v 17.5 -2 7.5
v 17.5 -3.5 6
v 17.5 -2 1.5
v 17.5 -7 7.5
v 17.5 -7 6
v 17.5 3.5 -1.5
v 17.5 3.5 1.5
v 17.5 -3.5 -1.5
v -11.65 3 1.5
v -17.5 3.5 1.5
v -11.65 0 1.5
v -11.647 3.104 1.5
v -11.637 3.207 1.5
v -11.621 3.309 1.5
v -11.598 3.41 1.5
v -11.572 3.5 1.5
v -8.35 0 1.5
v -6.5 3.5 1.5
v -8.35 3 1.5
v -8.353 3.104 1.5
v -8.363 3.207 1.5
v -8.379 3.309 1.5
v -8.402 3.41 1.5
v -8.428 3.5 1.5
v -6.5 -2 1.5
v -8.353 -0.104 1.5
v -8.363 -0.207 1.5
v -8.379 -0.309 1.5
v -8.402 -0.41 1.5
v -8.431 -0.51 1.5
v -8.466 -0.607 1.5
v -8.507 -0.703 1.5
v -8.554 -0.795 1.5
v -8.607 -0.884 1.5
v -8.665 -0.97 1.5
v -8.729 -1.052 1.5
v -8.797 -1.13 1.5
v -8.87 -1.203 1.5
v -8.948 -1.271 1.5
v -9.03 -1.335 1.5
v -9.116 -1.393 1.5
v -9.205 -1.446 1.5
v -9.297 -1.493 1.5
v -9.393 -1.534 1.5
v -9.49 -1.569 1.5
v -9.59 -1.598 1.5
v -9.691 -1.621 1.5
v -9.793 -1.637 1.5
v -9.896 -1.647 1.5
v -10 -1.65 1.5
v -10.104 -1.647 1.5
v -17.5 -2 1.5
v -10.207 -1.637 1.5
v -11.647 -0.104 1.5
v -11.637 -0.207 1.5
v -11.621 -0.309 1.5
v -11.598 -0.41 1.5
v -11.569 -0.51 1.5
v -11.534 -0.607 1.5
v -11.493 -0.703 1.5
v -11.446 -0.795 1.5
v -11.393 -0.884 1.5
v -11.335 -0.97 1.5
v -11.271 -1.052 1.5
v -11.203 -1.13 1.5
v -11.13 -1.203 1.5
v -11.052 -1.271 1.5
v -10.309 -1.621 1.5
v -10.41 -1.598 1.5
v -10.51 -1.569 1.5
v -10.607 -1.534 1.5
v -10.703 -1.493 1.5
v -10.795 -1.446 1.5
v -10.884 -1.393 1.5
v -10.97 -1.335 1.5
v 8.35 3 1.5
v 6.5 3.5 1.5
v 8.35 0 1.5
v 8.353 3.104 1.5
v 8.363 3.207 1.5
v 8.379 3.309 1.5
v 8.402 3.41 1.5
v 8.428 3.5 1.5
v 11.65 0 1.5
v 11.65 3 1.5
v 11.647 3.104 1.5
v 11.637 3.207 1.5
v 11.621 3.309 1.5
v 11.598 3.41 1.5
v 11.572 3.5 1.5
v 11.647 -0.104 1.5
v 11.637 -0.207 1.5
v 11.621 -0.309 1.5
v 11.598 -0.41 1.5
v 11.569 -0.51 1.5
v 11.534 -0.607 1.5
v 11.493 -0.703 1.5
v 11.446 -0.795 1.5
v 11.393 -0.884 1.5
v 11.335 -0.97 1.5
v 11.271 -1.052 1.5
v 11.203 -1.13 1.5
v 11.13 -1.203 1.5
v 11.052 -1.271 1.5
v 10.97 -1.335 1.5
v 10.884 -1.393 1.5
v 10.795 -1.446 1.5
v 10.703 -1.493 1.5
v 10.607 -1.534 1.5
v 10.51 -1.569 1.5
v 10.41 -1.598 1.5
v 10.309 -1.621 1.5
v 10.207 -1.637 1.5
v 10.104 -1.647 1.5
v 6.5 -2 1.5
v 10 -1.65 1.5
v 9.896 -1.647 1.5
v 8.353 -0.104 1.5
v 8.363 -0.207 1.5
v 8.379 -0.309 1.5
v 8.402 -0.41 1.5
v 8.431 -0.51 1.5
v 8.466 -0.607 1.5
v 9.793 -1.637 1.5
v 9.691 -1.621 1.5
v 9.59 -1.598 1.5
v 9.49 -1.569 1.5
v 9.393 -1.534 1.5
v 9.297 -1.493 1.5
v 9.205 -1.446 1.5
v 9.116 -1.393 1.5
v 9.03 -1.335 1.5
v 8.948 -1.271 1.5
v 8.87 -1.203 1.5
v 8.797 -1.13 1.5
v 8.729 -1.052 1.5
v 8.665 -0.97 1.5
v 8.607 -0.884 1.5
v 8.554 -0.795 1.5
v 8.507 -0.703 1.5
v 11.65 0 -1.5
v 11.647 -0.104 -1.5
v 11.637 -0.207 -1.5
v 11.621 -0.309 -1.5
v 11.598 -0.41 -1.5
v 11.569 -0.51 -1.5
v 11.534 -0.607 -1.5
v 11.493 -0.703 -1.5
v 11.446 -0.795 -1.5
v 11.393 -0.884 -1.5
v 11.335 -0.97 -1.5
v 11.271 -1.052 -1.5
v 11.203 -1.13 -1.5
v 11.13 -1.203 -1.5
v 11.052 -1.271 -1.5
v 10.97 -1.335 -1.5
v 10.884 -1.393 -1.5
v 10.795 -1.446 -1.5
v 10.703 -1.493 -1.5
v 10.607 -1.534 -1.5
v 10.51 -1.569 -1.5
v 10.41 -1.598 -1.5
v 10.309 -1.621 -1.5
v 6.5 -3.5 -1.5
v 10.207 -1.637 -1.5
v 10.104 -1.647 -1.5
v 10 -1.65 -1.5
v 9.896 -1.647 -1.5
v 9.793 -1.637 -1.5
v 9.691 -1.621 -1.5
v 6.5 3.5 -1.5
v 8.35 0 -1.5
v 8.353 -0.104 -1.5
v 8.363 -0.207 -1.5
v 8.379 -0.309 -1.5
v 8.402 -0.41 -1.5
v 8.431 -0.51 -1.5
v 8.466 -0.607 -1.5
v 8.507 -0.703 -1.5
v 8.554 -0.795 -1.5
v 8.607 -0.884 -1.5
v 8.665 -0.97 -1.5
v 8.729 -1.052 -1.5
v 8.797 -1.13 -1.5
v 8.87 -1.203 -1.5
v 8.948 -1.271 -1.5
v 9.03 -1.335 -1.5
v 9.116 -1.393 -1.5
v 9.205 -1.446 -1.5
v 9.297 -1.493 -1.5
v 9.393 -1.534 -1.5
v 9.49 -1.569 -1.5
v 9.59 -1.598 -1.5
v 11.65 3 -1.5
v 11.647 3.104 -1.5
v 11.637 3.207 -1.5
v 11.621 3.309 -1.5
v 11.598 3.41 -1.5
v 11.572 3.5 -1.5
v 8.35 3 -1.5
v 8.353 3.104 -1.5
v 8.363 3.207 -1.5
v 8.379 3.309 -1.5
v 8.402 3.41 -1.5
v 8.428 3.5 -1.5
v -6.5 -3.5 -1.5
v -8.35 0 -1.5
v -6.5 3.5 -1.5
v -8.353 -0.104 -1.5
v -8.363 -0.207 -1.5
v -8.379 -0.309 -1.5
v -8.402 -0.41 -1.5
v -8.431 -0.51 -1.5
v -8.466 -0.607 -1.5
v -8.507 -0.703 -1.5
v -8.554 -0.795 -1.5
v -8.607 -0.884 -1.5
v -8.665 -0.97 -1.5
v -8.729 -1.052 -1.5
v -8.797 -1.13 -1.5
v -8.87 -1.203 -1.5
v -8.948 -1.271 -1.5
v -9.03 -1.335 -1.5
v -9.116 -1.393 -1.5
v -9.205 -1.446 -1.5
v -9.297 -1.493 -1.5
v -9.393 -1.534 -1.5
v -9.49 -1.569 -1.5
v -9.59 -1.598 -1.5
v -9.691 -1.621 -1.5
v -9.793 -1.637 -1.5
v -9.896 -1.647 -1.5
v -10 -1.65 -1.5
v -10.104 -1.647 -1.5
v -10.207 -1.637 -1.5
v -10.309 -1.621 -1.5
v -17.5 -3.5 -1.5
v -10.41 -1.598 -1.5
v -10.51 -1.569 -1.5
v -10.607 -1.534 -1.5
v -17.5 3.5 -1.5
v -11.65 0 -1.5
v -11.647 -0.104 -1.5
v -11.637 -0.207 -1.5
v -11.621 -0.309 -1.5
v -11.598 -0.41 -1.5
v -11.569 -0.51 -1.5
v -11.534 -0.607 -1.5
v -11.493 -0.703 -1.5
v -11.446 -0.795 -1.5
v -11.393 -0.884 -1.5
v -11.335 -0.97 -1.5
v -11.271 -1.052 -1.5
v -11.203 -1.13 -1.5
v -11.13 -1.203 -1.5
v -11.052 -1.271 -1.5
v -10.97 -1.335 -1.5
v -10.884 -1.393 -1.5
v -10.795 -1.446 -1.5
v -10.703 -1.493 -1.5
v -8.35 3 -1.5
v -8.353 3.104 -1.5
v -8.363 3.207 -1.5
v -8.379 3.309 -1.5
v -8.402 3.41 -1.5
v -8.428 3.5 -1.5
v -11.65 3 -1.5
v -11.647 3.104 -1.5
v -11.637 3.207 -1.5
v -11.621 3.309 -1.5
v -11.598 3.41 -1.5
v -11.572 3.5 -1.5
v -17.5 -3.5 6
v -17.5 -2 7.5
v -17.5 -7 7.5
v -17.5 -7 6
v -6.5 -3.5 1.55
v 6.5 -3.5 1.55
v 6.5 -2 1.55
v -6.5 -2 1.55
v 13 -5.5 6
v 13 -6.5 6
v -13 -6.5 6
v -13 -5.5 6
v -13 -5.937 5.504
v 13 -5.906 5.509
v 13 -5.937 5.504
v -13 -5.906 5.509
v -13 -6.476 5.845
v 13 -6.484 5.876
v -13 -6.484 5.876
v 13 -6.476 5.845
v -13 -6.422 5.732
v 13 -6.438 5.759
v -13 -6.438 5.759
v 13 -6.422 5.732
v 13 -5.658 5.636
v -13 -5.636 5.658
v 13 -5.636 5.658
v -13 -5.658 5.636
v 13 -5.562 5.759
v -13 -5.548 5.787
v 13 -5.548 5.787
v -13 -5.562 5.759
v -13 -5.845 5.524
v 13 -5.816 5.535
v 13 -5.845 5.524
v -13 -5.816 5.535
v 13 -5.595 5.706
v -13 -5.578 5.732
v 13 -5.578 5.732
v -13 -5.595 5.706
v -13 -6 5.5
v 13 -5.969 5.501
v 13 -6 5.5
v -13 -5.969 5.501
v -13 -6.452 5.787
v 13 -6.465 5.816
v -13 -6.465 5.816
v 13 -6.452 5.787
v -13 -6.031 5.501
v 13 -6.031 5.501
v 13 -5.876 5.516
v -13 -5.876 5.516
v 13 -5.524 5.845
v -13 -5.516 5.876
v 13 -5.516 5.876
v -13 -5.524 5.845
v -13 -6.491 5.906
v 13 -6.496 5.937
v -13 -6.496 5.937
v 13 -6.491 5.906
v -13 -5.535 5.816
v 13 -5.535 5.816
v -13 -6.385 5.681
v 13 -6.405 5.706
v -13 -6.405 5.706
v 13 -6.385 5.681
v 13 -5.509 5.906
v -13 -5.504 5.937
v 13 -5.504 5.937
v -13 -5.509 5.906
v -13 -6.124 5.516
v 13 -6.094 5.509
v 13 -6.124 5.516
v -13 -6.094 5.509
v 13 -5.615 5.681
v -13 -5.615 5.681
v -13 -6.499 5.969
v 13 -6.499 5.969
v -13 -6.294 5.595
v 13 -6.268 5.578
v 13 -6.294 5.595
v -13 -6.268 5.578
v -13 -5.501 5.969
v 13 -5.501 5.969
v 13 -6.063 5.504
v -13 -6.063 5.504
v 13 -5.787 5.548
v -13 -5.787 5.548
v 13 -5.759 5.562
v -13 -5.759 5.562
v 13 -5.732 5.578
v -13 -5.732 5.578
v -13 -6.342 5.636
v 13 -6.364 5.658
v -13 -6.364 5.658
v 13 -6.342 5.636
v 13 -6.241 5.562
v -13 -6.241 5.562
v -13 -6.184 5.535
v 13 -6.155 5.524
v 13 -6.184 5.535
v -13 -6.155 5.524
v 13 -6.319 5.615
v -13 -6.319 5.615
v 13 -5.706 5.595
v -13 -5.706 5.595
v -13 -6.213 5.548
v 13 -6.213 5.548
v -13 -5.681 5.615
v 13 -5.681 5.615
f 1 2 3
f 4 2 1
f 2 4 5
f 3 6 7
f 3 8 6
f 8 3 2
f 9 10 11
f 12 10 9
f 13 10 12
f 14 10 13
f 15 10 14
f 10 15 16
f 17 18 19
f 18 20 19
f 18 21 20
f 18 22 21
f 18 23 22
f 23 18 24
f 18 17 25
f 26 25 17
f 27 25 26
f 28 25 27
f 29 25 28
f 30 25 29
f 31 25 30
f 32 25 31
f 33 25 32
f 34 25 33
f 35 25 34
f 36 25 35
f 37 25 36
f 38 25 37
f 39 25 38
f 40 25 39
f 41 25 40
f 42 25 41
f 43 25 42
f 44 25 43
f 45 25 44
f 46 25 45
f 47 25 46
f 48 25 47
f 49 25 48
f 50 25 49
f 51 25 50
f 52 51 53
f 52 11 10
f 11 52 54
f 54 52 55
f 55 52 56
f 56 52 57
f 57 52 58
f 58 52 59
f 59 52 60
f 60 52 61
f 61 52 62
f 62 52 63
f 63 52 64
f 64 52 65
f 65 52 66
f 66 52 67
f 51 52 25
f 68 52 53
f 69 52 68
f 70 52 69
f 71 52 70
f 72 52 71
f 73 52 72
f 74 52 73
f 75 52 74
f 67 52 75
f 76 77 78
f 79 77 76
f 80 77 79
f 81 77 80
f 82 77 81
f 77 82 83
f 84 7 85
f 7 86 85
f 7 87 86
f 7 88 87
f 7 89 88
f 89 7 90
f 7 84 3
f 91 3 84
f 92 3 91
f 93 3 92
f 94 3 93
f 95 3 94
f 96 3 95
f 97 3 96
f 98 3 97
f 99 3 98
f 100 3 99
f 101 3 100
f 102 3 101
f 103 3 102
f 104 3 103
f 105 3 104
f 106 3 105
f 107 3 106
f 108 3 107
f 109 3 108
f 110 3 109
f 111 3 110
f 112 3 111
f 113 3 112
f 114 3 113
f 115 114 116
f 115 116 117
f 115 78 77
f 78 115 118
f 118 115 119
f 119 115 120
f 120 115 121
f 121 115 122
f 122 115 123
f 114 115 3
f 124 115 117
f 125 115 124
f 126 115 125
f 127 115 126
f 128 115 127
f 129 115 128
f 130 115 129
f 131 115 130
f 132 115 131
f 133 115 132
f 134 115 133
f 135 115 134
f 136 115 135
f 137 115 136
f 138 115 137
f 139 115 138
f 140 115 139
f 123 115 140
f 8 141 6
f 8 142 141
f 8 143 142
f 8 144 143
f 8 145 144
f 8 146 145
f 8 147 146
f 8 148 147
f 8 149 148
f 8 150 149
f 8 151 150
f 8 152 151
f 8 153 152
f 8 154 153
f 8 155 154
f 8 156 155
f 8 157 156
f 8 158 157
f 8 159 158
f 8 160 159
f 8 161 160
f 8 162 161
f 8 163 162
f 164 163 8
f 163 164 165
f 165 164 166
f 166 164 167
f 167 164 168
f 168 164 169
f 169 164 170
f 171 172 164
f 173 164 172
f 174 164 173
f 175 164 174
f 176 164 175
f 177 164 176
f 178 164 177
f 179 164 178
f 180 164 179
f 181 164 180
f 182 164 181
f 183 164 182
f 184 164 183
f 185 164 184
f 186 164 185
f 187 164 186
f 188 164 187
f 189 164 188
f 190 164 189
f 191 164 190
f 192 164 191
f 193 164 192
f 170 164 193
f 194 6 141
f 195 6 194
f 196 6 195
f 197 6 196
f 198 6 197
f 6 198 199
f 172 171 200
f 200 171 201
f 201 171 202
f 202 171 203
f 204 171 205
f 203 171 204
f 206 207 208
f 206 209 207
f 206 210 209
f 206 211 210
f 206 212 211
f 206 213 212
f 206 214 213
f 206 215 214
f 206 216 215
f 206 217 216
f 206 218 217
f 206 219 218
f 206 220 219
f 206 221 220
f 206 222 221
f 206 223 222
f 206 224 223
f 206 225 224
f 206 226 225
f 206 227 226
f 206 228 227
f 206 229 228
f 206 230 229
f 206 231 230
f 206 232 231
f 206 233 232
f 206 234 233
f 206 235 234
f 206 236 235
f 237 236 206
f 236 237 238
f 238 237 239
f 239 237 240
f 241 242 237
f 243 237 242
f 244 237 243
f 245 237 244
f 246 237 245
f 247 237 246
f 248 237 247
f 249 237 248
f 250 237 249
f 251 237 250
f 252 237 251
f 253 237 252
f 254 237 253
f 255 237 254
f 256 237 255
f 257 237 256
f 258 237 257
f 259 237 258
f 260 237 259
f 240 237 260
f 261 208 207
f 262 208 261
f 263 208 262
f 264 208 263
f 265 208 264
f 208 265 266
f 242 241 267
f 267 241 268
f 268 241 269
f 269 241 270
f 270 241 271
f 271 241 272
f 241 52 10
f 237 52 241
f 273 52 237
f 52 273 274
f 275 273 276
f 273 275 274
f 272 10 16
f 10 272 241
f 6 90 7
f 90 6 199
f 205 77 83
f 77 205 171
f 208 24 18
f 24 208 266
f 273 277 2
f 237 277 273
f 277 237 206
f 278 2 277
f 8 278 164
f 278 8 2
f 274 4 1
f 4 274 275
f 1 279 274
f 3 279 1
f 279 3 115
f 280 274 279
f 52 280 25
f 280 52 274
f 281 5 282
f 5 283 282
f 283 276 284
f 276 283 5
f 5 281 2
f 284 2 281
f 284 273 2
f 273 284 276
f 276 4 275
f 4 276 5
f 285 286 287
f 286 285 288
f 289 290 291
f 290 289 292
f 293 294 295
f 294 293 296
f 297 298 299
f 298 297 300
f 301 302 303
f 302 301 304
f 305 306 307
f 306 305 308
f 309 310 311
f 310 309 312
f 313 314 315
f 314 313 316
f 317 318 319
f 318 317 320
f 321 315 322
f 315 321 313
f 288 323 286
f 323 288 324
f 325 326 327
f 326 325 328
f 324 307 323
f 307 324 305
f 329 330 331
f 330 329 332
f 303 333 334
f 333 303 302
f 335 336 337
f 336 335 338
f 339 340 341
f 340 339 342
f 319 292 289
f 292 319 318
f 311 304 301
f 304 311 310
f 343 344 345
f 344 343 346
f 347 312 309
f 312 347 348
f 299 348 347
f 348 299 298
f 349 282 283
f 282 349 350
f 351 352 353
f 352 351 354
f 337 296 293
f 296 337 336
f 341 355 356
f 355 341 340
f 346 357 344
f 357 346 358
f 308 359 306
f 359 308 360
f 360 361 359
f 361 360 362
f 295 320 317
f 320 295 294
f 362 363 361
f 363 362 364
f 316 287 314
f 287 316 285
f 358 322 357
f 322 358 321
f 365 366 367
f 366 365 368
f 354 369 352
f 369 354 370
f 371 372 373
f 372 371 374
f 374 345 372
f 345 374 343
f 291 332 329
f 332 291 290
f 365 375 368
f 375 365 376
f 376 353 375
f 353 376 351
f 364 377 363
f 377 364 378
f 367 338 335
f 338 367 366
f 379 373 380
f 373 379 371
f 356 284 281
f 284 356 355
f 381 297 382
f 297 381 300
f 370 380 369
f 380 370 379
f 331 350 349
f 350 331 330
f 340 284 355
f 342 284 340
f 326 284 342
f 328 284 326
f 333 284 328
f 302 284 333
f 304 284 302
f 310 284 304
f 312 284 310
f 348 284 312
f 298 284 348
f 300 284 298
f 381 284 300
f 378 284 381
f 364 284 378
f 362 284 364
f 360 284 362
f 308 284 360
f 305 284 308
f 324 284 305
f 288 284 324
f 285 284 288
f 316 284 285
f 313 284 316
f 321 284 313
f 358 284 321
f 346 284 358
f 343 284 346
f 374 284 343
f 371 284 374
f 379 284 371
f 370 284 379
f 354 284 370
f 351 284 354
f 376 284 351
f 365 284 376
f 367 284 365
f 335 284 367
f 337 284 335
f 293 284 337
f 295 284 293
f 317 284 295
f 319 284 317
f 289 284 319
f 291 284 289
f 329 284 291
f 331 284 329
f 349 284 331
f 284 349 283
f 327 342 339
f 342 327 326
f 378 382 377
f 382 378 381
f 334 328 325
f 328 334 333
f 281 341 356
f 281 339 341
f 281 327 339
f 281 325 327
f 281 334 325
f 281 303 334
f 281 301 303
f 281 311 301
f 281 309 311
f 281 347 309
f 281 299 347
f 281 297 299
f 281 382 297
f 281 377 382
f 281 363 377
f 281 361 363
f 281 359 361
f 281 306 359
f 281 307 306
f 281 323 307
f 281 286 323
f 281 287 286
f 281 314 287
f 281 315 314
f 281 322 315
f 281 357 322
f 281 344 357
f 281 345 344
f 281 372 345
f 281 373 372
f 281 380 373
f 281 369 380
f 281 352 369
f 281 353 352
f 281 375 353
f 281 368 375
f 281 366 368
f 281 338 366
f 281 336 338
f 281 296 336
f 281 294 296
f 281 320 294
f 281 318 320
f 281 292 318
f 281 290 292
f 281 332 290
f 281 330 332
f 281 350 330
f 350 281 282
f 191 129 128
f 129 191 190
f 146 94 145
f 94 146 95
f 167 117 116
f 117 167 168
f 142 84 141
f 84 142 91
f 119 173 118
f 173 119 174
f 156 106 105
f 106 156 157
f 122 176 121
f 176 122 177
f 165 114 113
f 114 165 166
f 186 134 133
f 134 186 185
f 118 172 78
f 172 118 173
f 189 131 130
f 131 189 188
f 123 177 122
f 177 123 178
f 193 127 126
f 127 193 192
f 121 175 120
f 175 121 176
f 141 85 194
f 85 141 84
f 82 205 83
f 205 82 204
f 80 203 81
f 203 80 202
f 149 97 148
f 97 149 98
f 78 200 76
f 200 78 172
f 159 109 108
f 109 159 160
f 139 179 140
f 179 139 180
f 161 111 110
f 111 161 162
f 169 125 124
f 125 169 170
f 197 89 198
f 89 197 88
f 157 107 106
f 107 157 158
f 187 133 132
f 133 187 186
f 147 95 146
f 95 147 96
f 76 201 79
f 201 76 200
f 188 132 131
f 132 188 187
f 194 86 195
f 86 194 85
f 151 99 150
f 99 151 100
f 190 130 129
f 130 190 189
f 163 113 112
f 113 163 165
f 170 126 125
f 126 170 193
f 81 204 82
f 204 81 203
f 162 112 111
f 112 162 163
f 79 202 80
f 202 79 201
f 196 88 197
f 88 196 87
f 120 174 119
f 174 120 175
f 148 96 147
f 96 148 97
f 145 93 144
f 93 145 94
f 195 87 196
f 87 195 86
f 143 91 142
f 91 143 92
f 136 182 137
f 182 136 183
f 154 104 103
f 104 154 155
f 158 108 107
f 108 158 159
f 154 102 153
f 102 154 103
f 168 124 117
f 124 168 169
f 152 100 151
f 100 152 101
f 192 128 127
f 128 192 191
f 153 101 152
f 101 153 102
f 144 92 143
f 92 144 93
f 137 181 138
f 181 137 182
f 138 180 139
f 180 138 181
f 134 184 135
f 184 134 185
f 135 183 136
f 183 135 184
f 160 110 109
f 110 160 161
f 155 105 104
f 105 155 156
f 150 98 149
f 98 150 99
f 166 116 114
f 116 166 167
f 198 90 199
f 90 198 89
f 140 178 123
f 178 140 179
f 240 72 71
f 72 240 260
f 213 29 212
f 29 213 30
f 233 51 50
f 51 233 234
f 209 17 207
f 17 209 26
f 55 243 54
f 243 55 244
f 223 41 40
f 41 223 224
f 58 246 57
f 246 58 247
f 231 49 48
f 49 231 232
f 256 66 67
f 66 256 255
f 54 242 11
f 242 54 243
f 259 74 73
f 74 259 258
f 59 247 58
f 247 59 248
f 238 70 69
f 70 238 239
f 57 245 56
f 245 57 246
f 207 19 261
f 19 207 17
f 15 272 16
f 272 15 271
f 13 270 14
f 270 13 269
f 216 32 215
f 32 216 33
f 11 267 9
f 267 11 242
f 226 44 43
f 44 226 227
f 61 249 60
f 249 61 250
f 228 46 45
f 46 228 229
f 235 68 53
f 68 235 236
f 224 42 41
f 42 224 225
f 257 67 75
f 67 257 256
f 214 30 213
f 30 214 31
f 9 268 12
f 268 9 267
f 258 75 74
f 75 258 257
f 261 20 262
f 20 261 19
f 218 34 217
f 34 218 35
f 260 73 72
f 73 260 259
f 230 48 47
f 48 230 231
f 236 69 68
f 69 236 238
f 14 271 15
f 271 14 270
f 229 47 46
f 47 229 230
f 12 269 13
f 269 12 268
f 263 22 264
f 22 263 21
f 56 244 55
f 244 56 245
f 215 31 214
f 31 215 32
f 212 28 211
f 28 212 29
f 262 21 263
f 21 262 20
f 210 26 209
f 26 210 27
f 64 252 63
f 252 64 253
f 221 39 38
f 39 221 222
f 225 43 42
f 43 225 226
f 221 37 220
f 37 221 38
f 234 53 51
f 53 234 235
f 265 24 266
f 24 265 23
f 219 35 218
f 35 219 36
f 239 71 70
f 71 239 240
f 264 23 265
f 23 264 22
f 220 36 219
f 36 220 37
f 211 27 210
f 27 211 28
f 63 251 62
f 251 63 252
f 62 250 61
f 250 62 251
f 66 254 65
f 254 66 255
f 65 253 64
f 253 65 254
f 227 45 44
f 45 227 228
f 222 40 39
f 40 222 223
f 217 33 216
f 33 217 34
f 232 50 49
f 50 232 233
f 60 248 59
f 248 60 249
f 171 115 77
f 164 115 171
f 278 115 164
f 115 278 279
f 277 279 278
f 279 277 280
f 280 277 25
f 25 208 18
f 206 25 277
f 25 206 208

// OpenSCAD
// file: ssc_plexi_DIMENSIONS.scad
/** INCLUDE FILES **/



/***************************************************************************
 *
 *                            GLOBAL DIMENSION PARAMETERS
 *
 ***************************************************************************/

 /** FRONT PANEL SECTION  **/
//    FRONT_PANEL_WIDTH  = 156;
//    FRONT_PANEL_DEPTH  =  85; 
FRONT_PANEL_HEIGHT =   6;  //.. Material thickness

 /** BOTTOM PANEL BLIND VERSION **/
//  BOTTOM_PANEL_WIDTH = 164;
//  BOTTOM_PANEL_DEPTH  =  70;
// BOTTOM_PANEL_HEIGHT =   4;  //.. Material thickness

 
 /** SIDE PANEL BLIND  **/
//  SIDE_PANEL_WIDTH  = BOTTOM_PANEL_DEPTH;
//  SIDE_PANEL_DEPTH  = FRONT_PANEL_DEPTH;
//  SIDE_PANEL_HEIGHT = 4;

 /**  LED DISPLAY DIMENSIONS  **/
LED_DISPLAY_WIDTH  =  121;
LED_DISPLAY_HEIGHT =   10;  //** LED Display height without backpack pcb
LED_DISPLAY_DEPTH  =   41;

LED_DISPLAY_WIDTH_3D  =  120;
LED_DISPLAY_HEIGHT_3D =   10;  //** LED Display height without backpack pcb
LED_DISPLAY_DEPTH_3D  =   41;

 /**  LED FRAME DIMENSIONS  **/
//  LED_DISPLAY_FRAME_WIDTH  = LED_DISPLAY_WIDTH + 3;
//  LED_DISPLAY_FRAME_HEIGHT = 4;  //LED_DISPLAY_HEIGHT;
//  LED_DISPLAY_FRAME_DEPTH  = LED_DISPLAY_DEPTH + 3;

  /**  CLOCK BOX OUTSIDE DIMENSIONS  **/
//  BOX_WIDTH          = FRONT_PANEL_WIDTH + 5;  //.. Add 5 mm to get 2.5 mm thick walls, Left/Right
//  BOX_DEPTH          = FRONT_PANEL_DEPTH + 5;  //.. Add 5 mm to get 2.5 mm thisc walls, Top/Bootom
//  BOX_HEIGHT         = 65;
//  BOX_WALL_THICKNESS =  3;

 /**  CLOCK BOX INSIDE DIMENSIONS  **/
//  CLOCK_BOX_INSIDE_WIDTH = CLOCK_BOX_WIDTH - CLOCK_BOX_WALL_THICKNESS * 2;
//  CLOCK_BOX_INSIDE_DEPTH = CLOCK_BOX_DEPTH - CLOCK_BOX_WALL_THICKNESS * 2;
//  CLOCK_BOX_INSIDE_HEIGHT = CLOCK_BOX_HEIGHT;

/************************************************************************/
/*                          NEW DEFINITIONS                             */
/************************************************************************/

BOX_WIDTH = 168;
BOX_DEPTH =  85;
BOX_HEIGHT = 75;
BOX_MATERIAL_THICKNESS = 4;
FRONT_MATERIAL_THICKNESS = 6;

FRONT_TRAIL_WIDTH = 6;
COMMON_TRAIL_WIDTH = 4;

FRONT_TRAIL_HEIGHT = BOX_MATERIAL_THICKNESS / 2;
COMMON_TRAIL_HEIGHT = BOX_MATERIAL_THICKNESS / 2;

FRONT_PANEL_WIDTH = BOX_WIDTH - 4.2 ;
FRONT_PANEL_DEPTH =  BOX_HEIGHT - 0.2;

BACK_PANEL_WIDTH =  BOX_WIDTH - 4.2 ;
BACK_PANEL_DEPTH =  BOX_HEIGHT - 0.2;
// main file
/*////////////////////////////////////////////////////////////////////////////
//////////////////////// Unit Information  ///////////////////////////////////
//////////////////////////////////////////////////////////////////////////////
date stated   : 2021-02-07
date finished : 2021-02-07
modeler       : Olle Johansson
application   : SevenSegmentClock (ClockNet)
module        : Detail_Parts
version       : 0.1 beta
copyright     : Pipe Dreams / Forrest Floor
subject       : Seven Segment Clock
description   : Additional detail parts for maounting the clock and its coponents

version history
date            description
2021-02-07	    Start of re-design
*/
$fn = 100;

include <ssc_plexi_DIMENSIONS.scad>;
use <ssc_plexi_PANELS.scad>;


/***************************************************************************
 *
 *                                LOCAL RENDER
 *                      Used to view modules locally
 *
 ***************************************************************************/
*frontPanelExt();
*ldrPanelAdaptor();
*cornerPanelConnectorFront();
*cornerPanelConnectorRear();
*connectorMatrix();
attachDisplayHookLeft();
*attachDisplayHookRight();

 /***************************************************************************
 *
 *                                MODULES
 *
 ***************************************************************************/

/************************************************************************************************************
 **  Module:      connectorMatrix
 **  Parameters : None
 **  Description: Combination of connector items to simplify milling
 **              
 ************************************************************************************************************/
module connectorMatrix() {
  difference() {
    union() {
      for (a = [0:3]) {
        translate([a*12,0,-2])
        cornerPanelConnectorFront();
      }
      for (a = [0:3]) {
        translate([a*12,18,-2])
        cornerPanelConnectorRear();
      }      
    }
  }
}

/************************************************************************************************************
 **  Module:      ldrPanelAdaptor
 **  Parameters : None
 **  Description: Adaptor for mounting LDR resistor in front panel
 **              
 ************************************************************************************************************/
module ldrPanelAdaptor() {
   adaptor_u_diameter          = 10.05;
   adaptor_height              = 7;

   adaptor_cable_hole_diameter = 4;

   ldr_fixture_diameter = 5.5;
   ldr_fixture_height    = 2.3;

   adaptor_fixing_ring_diameter = 13;
   adaptor_fixing_ring_height    =  2;


   adaptor_i_diameter          = 5.1;


   adaptor_inner_ring_diameter = 10;
   adaptor_inner_ring_height   = 10;
   adaptor_ldr_ring_hight      =  2.1;

   difference() {
     union() {
      cylinder(d=adaptor_u_diameter, h=adaptor_height);
      cylinder(d=adaptor_u_diameter, h=adaptor_height);
      translate([0,0,adaptor_height - adaptor_fixing_ring_height])
        cylinder(d=adaptor_fixing_ring_diameter, adaptor_fixing_ring_height);
     }
     translate([0,0,-0.1])
       cylinder(d=adaptor_cable_hole_diameter, h=adaptor_height+2);

      translate([0, 0, 2])
        cylinder(d2=adaptor_cable_hole_diameter-1,d1=adaptor_cable_hole_diameter+2, h=7);

     translate([0,0,-0.1])       
       cylinder(d=ldr_fixture_diameter, h=ldr_fixture_height);

      translate([0,-7.7,5])
        cube([10,5,5],center=true);


     *cylinder(d=adaptor_i_diameter, h=adaptor_inner_ring_height);
     *cylinder(d=adaptor_inner_ring_diameter, h=adaptor_height);
   }
 }


/************************************************************************************************************
 **  Module:      ldrResistor
 **  Parameters : None
 **  Description: LDR Resistor . used for reference to the LDR adaptor
 **              
 ************************************************************************************************************/
module ldrResistor() {
  ldrDiameter = 5.1;
  ldrHeight   = 1.95;
  difference() {
    union() {
      color("red") {
        cylinder(d=ldrDiameter, h=ldrHeight);
      }
    }
  }
 } 

/************************************************************************************************************
 **  Module:      cornerPanelConnectorFront
 **  Parameters : None
 **  Description: Detail for attaching the front and back panels to the middle section of the box.
 **               This detail is glued to the inner cornar at the back and front panels.
 **               The front panel is screwed from the insida of the box.
 **              
 ************************************************************************************************************/
module cornerPanelConnectorFront() {
   _angle_connector_width = 12;
   _angle_screw_hole_diam = 3;
   _angle_screw_height    = 3;
   difference() {
     union() {
       hull() {
         cylinder(d=_angle_screw_hole_diam, _angle_screw_height);
         
         translate([_angle_connector_width-5, 0, 0])  
           cylinder(d=_angle_screw_hole_diam, _angle_screw_height);

          translate([0,  _angle_connector_width, 0])  
            cylinder(d=_angle_screw_hole_diam, _angle_screw_height);
       }
     }
     translate([2.65, 2.6, 0])
       cylinder(d=_angle_screw_hole_diam, _angle_screw_height);
   }
  }

 /************************************************************************************************************
 **  Module:      cornerPanelConnectorRear
 **  Parameters : None
 **  Description: Detail for attaching the front and back panels to the middle section of the box.
 **               This detail is glued to the inner cornar at the back and front panels.
 **               The front panel is screwed from the insida of the box.
 **              
 ************************************************************************************************************/
module cornerPanelConnectorRear() {
   _angle_connector_width = 12;
   _angle_screw_hole_diam = 3;
   _angle_screw_height    = 3;
   difference() {
     union() {
       hull() {
         cylinder(d=_angle_screw_hole_diam, _angle_screw_height);
         
         translate([_angle_connector_width-5, 0, 0])  
           cylinder(d=_angle_screw_hole_diam, _angle_screw_height);

          translate([0,  _angle_connector_width, 0])  
            cylinder(d=_angle_screw_hole_diam, _angle_screw_height);
       }
     }
     translate([2.65, 2.6, 0])
       cylinder(d=_angle_screw_hole_diam-0.3, _angle_screw_height);
   }
  }

   /************************************************************************************************************
 **  Module:      cornerPanelConnectorRear
 **  Parameters : None
 **  Description: Detail for attaching the front and back panels to the middle section of the box.
 **               This detail is glued to the inner cornar at the back and front panels.
 **               The front panel is screwed from the insida of the box.
 **              
 ************************************************************************************************************/
module cornerPanelConnectorRear() {
   _angle_connector_width = 12;
   _angle_screw_hole_diam = 3;
   _angle_screw_height    = 3;
   difference() {
     union() {
       hull() {
         cylinder(d=_angle_screw_hole_diam, _angle_screw_height);
         
         translate([_angle_connector_width-5, 0, 0])  
           cylinder(d=_angle_screw_hole_diam, _angle_screw_height);

          translate([0,  _angle_connector_width, 0])  
            cylinder(d=_angle_screw_hole_diam, _angle_screw_height);
       }
     }
     translate([2.65, 2.6, 0])
       cylinder(d=_angle_screw_hole_diam-0.3, _angle_screw_height);
   }
  }

  /************************************************************************************************************
 **  Module:      attachDisplayHookLeft
 **  Parameters : None
 **  Description: Detail for attaching the front and back panels to the middle section of the box.
 **               This detail is glued to the inner cornar at the back and front panels.
 **               The front panel is screwed from the insida of the box.
 **              
 ************************************************************************************************************/
  module attachDisplayHookLeft() {

    _base_width  = 35;
    _base_depth  =  7;
    _base_height =  3;

    _wall_width = _base_width;
    _wall_depth = 1.5;
    _wall_height = 9;

    _hook_width = _base_width;
    _hook_depth = 5;
    _hook_height = 1.5;

    _m3_diameter = 3.3;
    _m3_length   = 4;

    _slot_width = 13;
    _slot_depth  =  10;
    _slot_height = _base_height;

    difference() {
      union() {

        *color("green") {
          translate([0, -5,3])
            cube([26, 6, 6],center=true);
        }  
        /** base segment **/
        cube([_base_width, _base_depth, _base_height],center=true);
        
        /** wall segment **/
        translate([0, -_base_depth/2 + _wall_depth/2, _wall_height/2 - _base_height/2])
          cube([_wall_width, _wall_depth, _wall_height],center=true);

        /** hook segment **/
        translate([0, -_base_depth/2 + _wall_depth/2 - _hook_depth/2 + _wall_depth/2, _wall_height - _hook_height - _hook_height/2])
          cube([_hook_width, _hook_depth, _hook_height],center=true);        
        
        translate([0, -6, 6])
          rotate([0,90,0])
            cylinder(d=1, h =26, center=true);
      }
      translate([10, 0,-2])
        hull() {
          cylinder(d=_m3_diameter, h=_m3_length);
          translate([0, 3, 0])
            cylinder(d=_m3_diameter, h=_m3_length);
        }

      translate([-10, 0 ,-2])
        hull() {
          cylinder(d=_m3_diameter, h=_m3_length);
          translate([0, 3, 0])
            cylinder(d=_m3_diameter, h=_m3_length);
        }

      translate([0, 1.1, 0])
        cube([_slot_width, _slot_depth, _slot_height + 0.1],center=true);        
    }
  }

  /************************************************************************************************************
 **  Module:      attachDisplayHookRight
 **  Parameters : None
 **  Description: Detail for attaching the front and back panels to the middle section of the box.
 **               This detail is glued to the inner cornar at the back and front panels.
 **               The front panel is screwed from the insida of the box.
 **              
 ************************************************************************************************************/
  module attachDisplayHookRight() {

    _base_width  = 35;
    _base_depth  =  7+5;
    _base_height =  3;

    _wall_width = _base_width;
    _wall_depth = 1.5;
    _wall_height = 9;

    _hook_width = _base_width;
    _hook_depth = 4.5;
    _hook_height = 1.5;

    _m3_diameter = 3.3;
    _m3_length   = 4;

    _slot_width = 13;
    _slot_depth  =  10;
    _slot_height = _base_height;

    difference() {
      union() {

        *color("green") {
          translate([0, -5,3])
            cube([26, 6, 6],center=true);
        }  
        /** base segment **/
        cube([_base_width, _base_depth, _base_height],center=true);
        
        /** wall segment **/
        translate([0, -_base_depth/2 + _wall_depth/2, _wall_height/2 - _base_height/2])
          cube([_wall_width, _wall_depth, _wall_height],center=true);

        /** hook segment **/
        translate([0, -_base_depth/2 + _wall_depth/2 - _hook_depth/2 + _wall_depth/2, _wall_height - _hook_height - _hook_height/2])
          cube([_hook_width, _hook_depth, _hook_height],center=true);        
        
        translate([0, -6, 6])
          rotate([0,90,0])
            cylinder(d=1, h =26, center=true);
      }
      translate([10, 0,-2])
        hull() {
          cylinder(d=_m3_diameter, h=_m3_length);
          translate([0, 3+5, 0])
            cylinder(d=_m3_diameter, h=_m3_length);
        }

      translate([-10, 0 ,-2])
        hull() {
          cylinder(d=_m3_diameter, h=_m3_length);
          translate([0, 3+5, 0])
            cylinder(d=_m3_diameter, h=_m3_length);
        }

      translate([0, 1.1, 0])
        cube([_slot_width, _slot_depth, _slot_height + 0.1],center=true);        

      *translate([0, 7,-2])
        cylinder(d=_m13_diameter, h=_m13_length);        
    }
  }
